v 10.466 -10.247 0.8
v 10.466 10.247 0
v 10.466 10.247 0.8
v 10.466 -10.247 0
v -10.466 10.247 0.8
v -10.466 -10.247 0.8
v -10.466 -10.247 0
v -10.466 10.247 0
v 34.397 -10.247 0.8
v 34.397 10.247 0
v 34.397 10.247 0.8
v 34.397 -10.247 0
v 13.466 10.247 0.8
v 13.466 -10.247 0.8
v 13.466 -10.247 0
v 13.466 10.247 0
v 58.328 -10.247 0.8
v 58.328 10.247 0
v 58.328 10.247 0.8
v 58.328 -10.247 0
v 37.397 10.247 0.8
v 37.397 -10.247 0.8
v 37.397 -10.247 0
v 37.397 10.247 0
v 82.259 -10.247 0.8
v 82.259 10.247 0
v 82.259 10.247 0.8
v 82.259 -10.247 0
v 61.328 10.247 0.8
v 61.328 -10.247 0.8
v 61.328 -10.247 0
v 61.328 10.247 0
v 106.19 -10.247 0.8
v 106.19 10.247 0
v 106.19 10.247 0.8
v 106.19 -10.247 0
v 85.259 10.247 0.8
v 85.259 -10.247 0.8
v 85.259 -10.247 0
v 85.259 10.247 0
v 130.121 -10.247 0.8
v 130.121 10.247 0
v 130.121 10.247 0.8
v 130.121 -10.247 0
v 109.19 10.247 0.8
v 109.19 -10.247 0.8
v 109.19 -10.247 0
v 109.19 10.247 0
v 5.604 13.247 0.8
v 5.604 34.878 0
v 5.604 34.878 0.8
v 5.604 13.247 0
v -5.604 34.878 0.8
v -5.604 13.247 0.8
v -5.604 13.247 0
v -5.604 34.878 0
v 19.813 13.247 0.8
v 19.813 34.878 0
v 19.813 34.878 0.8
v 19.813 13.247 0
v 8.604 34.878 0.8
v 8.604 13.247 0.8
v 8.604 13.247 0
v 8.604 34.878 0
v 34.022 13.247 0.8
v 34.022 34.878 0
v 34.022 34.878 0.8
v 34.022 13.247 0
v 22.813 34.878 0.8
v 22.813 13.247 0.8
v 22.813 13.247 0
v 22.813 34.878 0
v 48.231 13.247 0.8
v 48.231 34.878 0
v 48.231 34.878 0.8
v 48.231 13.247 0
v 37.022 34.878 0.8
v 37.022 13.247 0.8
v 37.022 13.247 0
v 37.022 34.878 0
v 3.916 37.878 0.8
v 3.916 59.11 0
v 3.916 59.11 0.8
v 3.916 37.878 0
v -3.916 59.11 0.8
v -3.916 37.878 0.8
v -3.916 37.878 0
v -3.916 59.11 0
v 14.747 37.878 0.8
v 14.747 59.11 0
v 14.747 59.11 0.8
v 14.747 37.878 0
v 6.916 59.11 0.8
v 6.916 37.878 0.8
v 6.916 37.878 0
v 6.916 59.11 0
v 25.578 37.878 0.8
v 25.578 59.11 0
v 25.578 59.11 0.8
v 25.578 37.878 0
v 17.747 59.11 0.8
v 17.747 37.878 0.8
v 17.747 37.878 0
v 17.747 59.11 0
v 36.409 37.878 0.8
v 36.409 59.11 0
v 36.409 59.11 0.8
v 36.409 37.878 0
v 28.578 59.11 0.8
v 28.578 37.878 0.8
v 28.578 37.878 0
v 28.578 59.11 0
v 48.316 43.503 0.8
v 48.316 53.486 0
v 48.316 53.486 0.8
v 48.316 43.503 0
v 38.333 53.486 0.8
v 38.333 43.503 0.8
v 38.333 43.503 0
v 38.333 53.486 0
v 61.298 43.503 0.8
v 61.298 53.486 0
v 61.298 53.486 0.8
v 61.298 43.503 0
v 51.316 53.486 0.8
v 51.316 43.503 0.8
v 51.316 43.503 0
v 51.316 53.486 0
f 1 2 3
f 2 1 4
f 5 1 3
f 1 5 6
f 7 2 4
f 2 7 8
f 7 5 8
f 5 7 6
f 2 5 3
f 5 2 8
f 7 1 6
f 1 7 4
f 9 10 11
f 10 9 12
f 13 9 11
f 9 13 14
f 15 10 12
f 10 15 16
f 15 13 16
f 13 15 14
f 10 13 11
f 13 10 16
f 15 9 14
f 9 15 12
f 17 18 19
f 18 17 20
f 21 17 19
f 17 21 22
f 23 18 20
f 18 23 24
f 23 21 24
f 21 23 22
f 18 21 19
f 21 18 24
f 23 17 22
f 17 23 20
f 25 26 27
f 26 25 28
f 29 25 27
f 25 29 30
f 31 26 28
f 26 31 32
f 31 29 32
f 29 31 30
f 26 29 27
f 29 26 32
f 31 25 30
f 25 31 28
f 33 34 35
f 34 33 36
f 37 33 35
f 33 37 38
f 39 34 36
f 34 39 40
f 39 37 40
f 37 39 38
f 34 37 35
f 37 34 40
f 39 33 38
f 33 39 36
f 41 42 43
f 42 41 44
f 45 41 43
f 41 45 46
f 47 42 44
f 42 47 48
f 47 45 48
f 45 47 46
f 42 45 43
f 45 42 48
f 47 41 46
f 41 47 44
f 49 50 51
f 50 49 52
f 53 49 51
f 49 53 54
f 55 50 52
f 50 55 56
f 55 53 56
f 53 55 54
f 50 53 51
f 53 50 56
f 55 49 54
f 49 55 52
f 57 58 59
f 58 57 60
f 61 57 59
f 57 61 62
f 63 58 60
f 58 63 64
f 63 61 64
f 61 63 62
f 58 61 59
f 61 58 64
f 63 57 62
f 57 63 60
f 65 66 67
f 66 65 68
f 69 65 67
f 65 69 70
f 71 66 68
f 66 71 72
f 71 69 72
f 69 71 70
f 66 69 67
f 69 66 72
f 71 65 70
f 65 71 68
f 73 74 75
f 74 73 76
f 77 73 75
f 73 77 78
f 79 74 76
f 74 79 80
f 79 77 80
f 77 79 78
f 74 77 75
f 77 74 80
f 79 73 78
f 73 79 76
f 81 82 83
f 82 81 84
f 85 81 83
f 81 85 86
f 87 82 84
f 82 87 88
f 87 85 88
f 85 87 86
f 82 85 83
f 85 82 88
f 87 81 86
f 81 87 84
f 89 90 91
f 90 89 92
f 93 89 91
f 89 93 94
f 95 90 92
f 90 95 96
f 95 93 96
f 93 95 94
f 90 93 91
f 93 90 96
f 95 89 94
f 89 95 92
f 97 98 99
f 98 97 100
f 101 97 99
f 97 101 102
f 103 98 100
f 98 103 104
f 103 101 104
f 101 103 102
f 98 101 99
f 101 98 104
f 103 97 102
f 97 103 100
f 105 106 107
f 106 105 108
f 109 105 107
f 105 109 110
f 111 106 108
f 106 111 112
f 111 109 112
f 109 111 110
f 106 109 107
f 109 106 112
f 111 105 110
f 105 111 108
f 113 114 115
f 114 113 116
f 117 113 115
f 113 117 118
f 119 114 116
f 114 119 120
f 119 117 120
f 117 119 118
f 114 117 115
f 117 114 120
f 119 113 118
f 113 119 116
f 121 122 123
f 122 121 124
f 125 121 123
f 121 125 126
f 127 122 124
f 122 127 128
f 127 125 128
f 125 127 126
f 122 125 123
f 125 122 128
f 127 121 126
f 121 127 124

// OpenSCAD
// =====================================================================
//  VIEW 14: GLAZING  -  print 1
//  Milwaukee Road 1939 rib side bay window caboose - G scale (1:29)
//  Window glazing sheet (all inserts)
//  Print orientation: flat
//
//  Open this file in OpenSCAD to look at just this part.
//  To export this part's STL: Render (F6), then File > Export > STL.
//  The part's code lives in library/glazing.scad; settings in
//  library/caboose_params.scad.
// =====================================================================

part     = "glazing";    // which part - leave as is
view     = "print";  // "print"     = laid out as it goes on the printer bed
                     //               (same as the exported STL)
                     // "installed" = in its place on the car (all copies)
show_car = false;    // with "installed": faint see-through body, roof and
                     //   underframe around it for context

include <../library/caboose_all.scad>

if (view == "installed") {
    caboose_installed(part);
    if (show_car) car_ghost();
} else {
    caboose_print(part);
}
echo(str("glazing: print 1"));
